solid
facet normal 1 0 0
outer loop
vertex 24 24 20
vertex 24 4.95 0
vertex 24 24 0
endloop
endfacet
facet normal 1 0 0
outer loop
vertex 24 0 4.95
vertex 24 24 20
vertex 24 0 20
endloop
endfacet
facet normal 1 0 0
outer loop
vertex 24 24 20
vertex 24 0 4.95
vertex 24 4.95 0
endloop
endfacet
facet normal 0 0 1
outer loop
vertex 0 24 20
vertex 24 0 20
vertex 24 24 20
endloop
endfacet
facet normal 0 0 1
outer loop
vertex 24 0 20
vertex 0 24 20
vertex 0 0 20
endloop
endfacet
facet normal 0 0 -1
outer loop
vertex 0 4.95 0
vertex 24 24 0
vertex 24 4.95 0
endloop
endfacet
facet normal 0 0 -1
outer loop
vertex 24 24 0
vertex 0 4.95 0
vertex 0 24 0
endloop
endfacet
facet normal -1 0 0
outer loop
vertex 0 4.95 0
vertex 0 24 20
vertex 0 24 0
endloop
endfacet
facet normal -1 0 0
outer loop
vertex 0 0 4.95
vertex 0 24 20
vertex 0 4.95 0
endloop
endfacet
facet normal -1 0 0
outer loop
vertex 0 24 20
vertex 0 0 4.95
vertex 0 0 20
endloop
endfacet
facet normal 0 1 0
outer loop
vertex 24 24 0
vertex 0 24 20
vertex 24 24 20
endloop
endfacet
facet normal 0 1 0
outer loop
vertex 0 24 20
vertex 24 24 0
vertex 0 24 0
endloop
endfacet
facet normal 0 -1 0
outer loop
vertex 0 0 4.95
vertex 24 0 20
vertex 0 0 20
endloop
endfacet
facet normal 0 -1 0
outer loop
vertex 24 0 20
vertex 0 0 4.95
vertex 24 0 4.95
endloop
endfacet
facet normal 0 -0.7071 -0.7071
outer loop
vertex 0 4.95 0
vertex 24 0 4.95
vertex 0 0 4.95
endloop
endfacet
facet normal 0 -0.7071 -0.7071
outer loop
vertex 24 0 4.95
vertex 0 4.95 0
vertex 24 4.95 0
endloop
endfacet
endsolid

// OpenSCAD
// Elephant's foot bottom chamfer: a small 45deg chamfer on a block's
// bottom outer edge to counter the elephant's-foot bulge.
$fn = 32;
sx = 24; sy = 24; sz = 20; c = 3.5;

difference() {
    cube([sx, sy, sz]);
    translate([sx / 2, 0, 0])
    rotate([-45, 0, 0])
    cube([sx + 2, c * 2, c * 2], center = true);
}
